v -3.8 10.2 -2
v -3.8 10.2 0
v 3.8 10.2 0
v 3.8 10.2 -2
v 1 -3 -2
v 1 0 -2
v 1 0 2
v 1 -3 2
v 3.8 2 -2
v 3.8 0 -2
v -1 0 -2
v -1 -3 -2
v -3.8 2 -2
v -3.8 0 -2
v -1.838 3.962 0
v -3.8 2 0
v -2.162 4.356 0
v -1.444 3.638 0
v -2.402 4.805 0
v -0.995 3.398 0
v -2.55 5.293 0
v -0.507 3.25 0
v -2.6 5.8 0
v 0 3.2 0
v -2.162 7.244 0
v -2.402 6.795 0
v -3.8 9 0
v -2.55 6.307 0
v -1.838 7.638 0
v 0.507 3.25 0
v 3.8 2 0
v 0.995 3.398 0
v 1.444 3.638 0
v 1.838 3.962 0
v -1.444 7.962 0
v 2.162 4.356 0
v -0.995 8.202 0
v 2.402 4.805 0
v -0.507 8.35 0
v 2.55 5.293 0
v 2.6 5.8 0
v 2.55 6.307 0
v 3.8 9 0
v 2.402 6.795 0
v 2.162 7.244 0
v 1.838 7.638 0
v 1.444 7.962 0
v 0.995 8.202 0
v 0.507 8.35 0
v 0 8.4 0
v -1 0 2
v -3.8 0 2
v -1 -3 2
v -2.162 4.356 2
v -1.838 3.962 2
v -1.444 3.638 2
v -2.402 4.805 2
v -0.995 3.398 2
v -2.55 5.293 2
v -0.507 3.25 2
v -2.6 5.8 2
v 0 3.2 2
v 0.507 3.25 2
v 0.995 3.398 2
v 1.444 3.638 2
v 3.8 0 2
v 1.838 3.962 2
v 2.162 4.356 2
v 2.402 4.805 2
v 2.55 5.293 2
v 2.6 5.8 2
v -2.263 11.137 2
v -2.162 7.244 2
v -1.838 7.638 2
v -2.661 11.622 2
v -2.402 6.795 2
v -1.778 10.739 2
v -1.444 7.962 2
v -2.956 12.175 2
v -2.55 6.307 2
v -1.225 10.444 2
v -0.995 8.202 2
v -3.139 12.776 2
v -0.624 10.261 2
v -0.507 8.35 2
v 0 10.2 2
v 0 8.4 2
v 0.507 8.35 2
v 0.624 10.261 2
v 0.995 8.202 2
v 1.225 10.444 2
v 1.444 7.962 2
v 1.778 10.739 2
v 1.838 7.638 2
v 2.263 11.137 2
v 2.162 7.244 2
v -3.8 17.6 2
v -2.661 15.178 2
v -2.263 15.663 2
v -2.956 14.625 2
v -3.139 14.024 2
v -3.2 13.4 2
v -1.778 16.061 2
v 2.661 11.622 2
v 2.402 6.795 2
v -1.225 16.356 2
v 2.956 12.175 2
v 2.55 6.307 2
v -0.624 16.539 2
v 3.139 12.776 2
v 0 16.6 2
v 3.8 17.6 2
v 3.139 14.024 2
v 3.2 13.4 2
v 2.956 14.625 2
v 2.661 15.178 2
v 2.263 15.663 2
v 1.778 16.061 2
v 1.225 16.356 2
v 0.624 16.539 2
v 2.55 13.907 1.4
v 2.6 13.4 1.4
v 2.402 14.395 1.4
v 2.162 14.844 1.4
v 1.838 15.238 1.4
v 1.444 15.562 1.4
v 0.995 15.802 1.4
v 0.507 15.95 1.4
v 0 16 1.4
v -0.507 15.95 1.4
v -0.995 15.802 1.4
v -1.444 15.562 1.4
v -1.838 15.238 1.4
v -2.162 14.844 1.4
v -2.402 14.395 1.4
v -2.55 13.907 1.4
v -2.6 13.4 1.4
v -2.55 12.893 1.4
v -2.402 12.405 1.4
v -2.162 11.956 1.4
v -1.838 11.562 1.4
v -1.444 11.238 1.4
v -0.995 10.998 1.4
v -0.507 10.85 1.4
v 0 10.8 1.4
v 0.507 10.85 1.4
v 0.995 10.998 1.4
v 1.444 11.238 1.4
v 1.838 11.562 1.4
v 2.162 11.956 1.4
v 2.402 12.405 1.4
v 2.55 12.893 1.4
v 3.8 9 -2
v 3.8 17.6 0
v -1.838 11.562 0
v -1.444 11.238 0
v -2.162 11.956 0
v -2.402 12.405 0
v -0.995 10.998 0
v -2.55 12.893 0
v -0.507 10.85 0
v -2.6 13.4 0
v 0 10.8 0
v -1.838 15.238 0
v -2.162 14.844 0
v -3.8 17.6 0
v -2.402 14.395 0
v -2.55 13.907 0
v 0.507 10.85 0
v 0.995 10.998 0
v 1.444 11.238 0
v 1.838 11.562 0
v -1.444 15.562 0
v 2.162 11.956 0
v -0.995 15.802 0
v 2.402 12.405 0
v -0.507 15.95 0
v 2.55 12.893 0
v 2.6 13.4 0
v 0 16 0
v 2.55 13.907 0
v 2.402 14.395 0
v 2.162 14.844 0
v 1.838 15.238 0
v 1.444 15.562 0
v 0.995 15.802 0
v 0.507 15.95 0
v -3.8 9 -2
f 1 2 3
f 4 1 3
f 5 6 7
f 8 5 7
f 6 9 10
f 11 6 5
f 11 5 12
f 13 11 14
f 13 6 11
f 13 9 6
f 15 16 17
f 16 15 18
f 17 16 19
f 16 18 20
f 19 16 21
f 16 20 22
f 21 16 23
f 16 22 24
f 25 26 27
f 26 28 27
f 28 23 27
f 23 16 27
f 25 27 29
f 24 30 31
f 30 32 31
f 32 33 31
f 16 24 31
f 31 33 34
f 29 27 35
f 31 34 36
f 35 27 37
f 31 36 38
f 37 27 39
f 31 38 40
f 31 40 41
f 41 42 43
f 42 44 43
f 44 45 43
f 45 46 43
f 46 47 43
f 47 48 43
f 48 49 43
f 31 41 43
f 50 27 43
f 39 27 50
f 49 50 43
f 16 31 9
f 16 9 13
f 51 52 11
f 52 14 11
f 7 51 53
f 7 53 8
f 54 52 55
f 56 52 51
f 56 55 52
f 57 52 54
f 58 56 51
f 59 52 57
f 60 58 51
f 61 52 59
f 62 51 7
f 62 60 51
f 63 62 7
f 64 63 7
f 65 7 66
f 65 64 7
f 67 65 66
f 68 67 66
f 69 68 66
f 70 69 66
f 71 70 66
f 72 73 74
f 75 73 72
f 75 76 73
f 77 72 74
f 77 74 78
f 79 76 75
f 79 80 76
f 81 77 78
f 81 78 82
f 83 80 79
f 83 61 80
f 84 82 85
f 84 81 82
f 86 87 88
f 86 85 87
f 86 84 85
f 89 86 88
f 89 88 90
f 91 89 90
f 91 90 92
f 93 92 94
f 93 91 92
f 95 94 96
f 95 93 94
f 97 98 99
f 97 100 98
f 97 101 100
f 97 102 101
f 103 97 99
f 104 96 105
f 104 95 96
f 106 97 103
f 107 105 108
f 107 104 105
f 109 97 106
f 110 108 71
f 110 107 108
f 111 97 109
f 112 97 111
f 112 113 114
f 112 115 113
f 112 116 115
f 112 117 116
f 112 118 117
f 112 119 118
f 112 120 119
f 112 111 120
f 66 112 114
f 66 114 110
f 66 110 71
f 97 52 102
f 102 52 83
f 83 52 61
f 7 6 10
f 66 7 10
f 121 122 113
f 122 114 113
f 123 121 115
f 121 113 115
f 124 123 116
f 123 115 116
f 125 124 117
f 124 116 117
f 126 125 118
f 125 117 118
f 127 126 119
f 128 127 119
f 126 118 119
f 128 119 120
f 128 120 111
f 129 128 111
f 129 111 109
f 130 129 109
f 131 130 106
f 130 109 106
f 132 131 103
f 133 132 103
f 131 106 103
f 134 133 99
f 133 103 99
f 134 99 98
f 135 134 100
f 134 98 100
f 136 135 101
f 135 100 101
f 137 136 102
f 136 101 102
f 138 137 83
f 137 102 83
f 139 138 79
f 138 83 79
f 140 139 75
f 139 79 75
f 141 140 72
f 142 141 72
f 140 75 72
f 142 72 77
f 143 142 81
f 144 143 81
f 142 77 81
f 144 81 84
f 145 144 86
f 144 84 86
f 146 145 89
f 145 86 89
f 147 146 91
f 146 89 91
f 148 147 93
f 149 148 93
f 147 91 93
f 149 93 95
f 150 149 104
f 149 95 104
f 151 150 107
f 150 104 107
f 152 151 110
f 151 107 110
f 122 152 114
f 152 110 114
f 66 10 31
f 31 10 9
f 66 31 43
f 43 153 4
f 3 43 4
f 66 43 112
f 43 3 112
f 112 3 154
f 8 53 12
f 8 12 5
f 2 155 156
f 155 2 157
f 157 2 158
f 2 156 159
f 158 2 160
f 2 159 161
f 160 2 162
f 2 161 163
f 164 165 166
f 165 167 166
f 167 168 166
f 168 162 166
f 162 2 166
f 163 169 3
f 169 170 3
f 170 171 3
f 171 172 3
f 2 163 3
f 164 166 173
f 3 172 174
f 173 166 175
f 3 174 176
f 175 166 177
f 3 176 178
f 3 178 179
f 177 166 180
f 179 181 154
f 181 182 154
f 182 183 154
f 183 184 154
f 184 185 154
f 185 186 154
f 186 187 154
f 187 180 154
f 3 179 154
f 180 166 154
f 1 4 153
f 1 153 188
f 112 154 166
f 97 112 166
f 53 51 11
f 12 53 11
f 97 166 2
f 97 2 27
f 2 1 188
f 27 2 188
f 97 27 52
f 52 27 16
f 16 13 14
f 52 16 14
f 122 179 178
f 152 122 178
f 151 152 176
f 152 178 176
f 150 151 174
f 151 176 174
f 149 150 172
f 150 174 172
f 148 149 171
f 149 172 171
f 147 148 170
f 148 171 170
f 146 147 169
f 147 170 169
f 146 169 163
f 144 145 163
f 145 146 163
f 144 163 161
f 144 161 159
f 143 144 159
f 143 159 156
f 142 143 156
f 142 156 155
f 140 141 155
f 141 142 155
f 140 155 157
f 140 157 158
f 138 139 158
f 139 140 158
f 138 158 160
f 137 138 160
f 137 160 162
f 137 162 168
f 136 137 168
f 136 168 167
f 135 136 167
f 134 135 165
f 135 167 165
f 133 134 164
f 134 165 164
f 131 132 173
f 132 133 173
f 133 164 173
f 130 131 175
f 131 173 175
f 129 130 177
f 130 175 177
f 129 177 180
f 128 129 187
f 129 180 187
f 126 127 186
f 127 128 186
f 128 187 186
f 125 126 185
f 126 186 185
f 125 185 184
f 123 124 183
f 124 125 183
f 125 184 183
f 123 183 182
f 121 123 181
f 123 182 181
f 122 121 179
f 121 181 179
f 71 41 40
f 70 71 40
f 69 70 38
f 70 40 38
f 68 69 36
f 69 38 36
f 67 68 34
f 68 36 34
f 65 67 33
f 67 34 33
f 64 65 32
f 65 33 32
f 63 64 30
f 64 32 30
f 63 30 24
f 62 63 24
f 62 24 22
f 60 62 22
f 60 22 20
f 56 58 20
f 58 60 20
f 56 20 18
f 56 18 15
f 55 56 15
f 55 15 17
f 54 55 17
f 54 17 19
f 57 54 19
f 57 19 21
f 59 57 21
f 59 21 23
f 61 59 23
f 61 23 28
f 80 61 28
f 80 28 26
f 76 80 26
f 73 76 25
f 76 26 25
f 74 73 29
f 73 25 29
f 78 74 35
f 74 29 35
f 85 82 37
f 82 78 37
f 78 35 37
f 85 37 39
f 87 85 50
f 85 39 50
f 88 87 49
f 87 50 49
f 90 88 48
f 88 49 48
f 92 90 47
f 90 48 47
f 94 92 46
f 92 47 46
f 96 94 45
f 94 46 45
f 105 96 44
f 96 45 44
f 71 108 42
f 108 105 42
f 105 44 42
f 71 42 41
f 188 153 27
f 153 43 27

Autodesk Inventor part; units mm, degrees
ref_plane "YZ Plane" through (0, 0, 0) normal (1, 0, 0) x (0, 1, 0)
ref_plane "XZ Plane" through (0, 0, 0) normal (0, 1, 0) x (-1, 0, 0)
ref_plane "XY Plane" through (0, 0, 0) normal (0, 0, 1) x (1, 0, 0)
sketch "スケッチ1" plane through (0, 0, 0) normal (0, 0, 1) x (1, 0, 0)
  circle A0 centre (0, 5.8) radius 2.6
  circle A1 centre (0, 13.4) radius 2.6
  line L0 (-3.8, 0) -> (3.8, 0)
  line L1 (3.8, 0) -> (3.8, 17.6)
  line L2 (3.8, 17.6) -> (-3.8, 17.6)
  line L3 (-3.8, 17.6) -> (-3.8, 0)
  line L4 (-11.5586, 9.6) -> (11.5586, 9.6) construction
  point P0 (0, 0)
  point P1 (0, 0)
  point P2 (0, 9.6)
  dimension "LED_DIA" = 5.2
  dimension "d1" = 7.6
  dimension "LED_PITCH" = 7.6
  dimension "TOP_MARGIN" = 4.2
  dimension "BOTTOM_MARGIN" = 5.8
extrude "スペーサ" add sketch "スケッチ1" along normal blind 2
sketch "スケッチ2" plane through (0, 0, 0) normal (0, 0, -1) x (-1, 0, 0)
  line L0 (3.8, 17.6) -> (3.8, 0) projected
  line L1 (-3.8, 0) -> (-3.8, 17.6) projected
  line L2 (3.8, 0) -> (-3.8, 0)
  line L3 (-3.8, 0) -> (-3.8, 2)
  line L4 (-3.8, 2) -> (3.8, 2)
  line L5 (3.8, 2) -> (3.8, 0)
  line L6 (3.8, 10.2) -> (-3.8, 10.2)
  line L7 (-3.8, 10.2) -> (-3.8, 9)
  line L8 (-3.8, 9) -> (3.8, 9)
  line L9 (3.8, 9) -> (3.8, 10.2)
  circle A0 centre (0, 5.8) radius 2.9 construction
  circle A1 centre (0, 13.4) radius 2.9 construction
  circle A2 centre (0, 5.8) radius 2.6 construction
  circle A3 centre (0, 13.4) radius 2.6 construction
  line L10 (6.2058, 13.4) -> (-6.2058, 13.4) construction
  line L11 (-6.2058, 5.8) -> (6.2058, 5.8) construction
  line L12 (6.2058, 9.6) -> (-6.2058, 9.6) construction
  point P0 (0, 0)
  point P1 (3.8, 9.6)
  point P2 (-3.8, 9)
  point P3 (3.8, 9)
  point P4 (3.8, 10.2)
  point P5 (-3.8, 10.2)
  dimension "d8" = 5.8
  dimension "d9" = 2
  dimension "d10" = 1.2
extrude "押し出し2" add sketch "スケッチ2" along normal blind 2 contours L0 L8 L1 L6 | L0 L2 L1 L4
chamfer "面取り1" distance 0.6 angle 45 1 edges at (-2.6, 13.4, 2)
sketch "スケッチ3" plane through (-3.8, 0, 2) normal (0, -1, 0) x (1, 0, 0)
  line L0 (0, 0) -> (7.6, 0) projected
  line L1 (7.6, -4) -> (0, -4) projected
  line L2 (4.8, 0) -> (2.8, 0)
  line L3 (2.8, 0) -> (2.8, -4)
  line L4 (2.8, -4) -> (4.8, -4)
  line L5 (4.8, -4) -> (4.8, 0)
  point P0 (3.8, -2)
  point P1 (3.8, 0)
  dimension "d16" = 2
extrude "押し出し3" add sketch "スケッチ3" along normal blind 3
properties part number "LED-Spacer1"
